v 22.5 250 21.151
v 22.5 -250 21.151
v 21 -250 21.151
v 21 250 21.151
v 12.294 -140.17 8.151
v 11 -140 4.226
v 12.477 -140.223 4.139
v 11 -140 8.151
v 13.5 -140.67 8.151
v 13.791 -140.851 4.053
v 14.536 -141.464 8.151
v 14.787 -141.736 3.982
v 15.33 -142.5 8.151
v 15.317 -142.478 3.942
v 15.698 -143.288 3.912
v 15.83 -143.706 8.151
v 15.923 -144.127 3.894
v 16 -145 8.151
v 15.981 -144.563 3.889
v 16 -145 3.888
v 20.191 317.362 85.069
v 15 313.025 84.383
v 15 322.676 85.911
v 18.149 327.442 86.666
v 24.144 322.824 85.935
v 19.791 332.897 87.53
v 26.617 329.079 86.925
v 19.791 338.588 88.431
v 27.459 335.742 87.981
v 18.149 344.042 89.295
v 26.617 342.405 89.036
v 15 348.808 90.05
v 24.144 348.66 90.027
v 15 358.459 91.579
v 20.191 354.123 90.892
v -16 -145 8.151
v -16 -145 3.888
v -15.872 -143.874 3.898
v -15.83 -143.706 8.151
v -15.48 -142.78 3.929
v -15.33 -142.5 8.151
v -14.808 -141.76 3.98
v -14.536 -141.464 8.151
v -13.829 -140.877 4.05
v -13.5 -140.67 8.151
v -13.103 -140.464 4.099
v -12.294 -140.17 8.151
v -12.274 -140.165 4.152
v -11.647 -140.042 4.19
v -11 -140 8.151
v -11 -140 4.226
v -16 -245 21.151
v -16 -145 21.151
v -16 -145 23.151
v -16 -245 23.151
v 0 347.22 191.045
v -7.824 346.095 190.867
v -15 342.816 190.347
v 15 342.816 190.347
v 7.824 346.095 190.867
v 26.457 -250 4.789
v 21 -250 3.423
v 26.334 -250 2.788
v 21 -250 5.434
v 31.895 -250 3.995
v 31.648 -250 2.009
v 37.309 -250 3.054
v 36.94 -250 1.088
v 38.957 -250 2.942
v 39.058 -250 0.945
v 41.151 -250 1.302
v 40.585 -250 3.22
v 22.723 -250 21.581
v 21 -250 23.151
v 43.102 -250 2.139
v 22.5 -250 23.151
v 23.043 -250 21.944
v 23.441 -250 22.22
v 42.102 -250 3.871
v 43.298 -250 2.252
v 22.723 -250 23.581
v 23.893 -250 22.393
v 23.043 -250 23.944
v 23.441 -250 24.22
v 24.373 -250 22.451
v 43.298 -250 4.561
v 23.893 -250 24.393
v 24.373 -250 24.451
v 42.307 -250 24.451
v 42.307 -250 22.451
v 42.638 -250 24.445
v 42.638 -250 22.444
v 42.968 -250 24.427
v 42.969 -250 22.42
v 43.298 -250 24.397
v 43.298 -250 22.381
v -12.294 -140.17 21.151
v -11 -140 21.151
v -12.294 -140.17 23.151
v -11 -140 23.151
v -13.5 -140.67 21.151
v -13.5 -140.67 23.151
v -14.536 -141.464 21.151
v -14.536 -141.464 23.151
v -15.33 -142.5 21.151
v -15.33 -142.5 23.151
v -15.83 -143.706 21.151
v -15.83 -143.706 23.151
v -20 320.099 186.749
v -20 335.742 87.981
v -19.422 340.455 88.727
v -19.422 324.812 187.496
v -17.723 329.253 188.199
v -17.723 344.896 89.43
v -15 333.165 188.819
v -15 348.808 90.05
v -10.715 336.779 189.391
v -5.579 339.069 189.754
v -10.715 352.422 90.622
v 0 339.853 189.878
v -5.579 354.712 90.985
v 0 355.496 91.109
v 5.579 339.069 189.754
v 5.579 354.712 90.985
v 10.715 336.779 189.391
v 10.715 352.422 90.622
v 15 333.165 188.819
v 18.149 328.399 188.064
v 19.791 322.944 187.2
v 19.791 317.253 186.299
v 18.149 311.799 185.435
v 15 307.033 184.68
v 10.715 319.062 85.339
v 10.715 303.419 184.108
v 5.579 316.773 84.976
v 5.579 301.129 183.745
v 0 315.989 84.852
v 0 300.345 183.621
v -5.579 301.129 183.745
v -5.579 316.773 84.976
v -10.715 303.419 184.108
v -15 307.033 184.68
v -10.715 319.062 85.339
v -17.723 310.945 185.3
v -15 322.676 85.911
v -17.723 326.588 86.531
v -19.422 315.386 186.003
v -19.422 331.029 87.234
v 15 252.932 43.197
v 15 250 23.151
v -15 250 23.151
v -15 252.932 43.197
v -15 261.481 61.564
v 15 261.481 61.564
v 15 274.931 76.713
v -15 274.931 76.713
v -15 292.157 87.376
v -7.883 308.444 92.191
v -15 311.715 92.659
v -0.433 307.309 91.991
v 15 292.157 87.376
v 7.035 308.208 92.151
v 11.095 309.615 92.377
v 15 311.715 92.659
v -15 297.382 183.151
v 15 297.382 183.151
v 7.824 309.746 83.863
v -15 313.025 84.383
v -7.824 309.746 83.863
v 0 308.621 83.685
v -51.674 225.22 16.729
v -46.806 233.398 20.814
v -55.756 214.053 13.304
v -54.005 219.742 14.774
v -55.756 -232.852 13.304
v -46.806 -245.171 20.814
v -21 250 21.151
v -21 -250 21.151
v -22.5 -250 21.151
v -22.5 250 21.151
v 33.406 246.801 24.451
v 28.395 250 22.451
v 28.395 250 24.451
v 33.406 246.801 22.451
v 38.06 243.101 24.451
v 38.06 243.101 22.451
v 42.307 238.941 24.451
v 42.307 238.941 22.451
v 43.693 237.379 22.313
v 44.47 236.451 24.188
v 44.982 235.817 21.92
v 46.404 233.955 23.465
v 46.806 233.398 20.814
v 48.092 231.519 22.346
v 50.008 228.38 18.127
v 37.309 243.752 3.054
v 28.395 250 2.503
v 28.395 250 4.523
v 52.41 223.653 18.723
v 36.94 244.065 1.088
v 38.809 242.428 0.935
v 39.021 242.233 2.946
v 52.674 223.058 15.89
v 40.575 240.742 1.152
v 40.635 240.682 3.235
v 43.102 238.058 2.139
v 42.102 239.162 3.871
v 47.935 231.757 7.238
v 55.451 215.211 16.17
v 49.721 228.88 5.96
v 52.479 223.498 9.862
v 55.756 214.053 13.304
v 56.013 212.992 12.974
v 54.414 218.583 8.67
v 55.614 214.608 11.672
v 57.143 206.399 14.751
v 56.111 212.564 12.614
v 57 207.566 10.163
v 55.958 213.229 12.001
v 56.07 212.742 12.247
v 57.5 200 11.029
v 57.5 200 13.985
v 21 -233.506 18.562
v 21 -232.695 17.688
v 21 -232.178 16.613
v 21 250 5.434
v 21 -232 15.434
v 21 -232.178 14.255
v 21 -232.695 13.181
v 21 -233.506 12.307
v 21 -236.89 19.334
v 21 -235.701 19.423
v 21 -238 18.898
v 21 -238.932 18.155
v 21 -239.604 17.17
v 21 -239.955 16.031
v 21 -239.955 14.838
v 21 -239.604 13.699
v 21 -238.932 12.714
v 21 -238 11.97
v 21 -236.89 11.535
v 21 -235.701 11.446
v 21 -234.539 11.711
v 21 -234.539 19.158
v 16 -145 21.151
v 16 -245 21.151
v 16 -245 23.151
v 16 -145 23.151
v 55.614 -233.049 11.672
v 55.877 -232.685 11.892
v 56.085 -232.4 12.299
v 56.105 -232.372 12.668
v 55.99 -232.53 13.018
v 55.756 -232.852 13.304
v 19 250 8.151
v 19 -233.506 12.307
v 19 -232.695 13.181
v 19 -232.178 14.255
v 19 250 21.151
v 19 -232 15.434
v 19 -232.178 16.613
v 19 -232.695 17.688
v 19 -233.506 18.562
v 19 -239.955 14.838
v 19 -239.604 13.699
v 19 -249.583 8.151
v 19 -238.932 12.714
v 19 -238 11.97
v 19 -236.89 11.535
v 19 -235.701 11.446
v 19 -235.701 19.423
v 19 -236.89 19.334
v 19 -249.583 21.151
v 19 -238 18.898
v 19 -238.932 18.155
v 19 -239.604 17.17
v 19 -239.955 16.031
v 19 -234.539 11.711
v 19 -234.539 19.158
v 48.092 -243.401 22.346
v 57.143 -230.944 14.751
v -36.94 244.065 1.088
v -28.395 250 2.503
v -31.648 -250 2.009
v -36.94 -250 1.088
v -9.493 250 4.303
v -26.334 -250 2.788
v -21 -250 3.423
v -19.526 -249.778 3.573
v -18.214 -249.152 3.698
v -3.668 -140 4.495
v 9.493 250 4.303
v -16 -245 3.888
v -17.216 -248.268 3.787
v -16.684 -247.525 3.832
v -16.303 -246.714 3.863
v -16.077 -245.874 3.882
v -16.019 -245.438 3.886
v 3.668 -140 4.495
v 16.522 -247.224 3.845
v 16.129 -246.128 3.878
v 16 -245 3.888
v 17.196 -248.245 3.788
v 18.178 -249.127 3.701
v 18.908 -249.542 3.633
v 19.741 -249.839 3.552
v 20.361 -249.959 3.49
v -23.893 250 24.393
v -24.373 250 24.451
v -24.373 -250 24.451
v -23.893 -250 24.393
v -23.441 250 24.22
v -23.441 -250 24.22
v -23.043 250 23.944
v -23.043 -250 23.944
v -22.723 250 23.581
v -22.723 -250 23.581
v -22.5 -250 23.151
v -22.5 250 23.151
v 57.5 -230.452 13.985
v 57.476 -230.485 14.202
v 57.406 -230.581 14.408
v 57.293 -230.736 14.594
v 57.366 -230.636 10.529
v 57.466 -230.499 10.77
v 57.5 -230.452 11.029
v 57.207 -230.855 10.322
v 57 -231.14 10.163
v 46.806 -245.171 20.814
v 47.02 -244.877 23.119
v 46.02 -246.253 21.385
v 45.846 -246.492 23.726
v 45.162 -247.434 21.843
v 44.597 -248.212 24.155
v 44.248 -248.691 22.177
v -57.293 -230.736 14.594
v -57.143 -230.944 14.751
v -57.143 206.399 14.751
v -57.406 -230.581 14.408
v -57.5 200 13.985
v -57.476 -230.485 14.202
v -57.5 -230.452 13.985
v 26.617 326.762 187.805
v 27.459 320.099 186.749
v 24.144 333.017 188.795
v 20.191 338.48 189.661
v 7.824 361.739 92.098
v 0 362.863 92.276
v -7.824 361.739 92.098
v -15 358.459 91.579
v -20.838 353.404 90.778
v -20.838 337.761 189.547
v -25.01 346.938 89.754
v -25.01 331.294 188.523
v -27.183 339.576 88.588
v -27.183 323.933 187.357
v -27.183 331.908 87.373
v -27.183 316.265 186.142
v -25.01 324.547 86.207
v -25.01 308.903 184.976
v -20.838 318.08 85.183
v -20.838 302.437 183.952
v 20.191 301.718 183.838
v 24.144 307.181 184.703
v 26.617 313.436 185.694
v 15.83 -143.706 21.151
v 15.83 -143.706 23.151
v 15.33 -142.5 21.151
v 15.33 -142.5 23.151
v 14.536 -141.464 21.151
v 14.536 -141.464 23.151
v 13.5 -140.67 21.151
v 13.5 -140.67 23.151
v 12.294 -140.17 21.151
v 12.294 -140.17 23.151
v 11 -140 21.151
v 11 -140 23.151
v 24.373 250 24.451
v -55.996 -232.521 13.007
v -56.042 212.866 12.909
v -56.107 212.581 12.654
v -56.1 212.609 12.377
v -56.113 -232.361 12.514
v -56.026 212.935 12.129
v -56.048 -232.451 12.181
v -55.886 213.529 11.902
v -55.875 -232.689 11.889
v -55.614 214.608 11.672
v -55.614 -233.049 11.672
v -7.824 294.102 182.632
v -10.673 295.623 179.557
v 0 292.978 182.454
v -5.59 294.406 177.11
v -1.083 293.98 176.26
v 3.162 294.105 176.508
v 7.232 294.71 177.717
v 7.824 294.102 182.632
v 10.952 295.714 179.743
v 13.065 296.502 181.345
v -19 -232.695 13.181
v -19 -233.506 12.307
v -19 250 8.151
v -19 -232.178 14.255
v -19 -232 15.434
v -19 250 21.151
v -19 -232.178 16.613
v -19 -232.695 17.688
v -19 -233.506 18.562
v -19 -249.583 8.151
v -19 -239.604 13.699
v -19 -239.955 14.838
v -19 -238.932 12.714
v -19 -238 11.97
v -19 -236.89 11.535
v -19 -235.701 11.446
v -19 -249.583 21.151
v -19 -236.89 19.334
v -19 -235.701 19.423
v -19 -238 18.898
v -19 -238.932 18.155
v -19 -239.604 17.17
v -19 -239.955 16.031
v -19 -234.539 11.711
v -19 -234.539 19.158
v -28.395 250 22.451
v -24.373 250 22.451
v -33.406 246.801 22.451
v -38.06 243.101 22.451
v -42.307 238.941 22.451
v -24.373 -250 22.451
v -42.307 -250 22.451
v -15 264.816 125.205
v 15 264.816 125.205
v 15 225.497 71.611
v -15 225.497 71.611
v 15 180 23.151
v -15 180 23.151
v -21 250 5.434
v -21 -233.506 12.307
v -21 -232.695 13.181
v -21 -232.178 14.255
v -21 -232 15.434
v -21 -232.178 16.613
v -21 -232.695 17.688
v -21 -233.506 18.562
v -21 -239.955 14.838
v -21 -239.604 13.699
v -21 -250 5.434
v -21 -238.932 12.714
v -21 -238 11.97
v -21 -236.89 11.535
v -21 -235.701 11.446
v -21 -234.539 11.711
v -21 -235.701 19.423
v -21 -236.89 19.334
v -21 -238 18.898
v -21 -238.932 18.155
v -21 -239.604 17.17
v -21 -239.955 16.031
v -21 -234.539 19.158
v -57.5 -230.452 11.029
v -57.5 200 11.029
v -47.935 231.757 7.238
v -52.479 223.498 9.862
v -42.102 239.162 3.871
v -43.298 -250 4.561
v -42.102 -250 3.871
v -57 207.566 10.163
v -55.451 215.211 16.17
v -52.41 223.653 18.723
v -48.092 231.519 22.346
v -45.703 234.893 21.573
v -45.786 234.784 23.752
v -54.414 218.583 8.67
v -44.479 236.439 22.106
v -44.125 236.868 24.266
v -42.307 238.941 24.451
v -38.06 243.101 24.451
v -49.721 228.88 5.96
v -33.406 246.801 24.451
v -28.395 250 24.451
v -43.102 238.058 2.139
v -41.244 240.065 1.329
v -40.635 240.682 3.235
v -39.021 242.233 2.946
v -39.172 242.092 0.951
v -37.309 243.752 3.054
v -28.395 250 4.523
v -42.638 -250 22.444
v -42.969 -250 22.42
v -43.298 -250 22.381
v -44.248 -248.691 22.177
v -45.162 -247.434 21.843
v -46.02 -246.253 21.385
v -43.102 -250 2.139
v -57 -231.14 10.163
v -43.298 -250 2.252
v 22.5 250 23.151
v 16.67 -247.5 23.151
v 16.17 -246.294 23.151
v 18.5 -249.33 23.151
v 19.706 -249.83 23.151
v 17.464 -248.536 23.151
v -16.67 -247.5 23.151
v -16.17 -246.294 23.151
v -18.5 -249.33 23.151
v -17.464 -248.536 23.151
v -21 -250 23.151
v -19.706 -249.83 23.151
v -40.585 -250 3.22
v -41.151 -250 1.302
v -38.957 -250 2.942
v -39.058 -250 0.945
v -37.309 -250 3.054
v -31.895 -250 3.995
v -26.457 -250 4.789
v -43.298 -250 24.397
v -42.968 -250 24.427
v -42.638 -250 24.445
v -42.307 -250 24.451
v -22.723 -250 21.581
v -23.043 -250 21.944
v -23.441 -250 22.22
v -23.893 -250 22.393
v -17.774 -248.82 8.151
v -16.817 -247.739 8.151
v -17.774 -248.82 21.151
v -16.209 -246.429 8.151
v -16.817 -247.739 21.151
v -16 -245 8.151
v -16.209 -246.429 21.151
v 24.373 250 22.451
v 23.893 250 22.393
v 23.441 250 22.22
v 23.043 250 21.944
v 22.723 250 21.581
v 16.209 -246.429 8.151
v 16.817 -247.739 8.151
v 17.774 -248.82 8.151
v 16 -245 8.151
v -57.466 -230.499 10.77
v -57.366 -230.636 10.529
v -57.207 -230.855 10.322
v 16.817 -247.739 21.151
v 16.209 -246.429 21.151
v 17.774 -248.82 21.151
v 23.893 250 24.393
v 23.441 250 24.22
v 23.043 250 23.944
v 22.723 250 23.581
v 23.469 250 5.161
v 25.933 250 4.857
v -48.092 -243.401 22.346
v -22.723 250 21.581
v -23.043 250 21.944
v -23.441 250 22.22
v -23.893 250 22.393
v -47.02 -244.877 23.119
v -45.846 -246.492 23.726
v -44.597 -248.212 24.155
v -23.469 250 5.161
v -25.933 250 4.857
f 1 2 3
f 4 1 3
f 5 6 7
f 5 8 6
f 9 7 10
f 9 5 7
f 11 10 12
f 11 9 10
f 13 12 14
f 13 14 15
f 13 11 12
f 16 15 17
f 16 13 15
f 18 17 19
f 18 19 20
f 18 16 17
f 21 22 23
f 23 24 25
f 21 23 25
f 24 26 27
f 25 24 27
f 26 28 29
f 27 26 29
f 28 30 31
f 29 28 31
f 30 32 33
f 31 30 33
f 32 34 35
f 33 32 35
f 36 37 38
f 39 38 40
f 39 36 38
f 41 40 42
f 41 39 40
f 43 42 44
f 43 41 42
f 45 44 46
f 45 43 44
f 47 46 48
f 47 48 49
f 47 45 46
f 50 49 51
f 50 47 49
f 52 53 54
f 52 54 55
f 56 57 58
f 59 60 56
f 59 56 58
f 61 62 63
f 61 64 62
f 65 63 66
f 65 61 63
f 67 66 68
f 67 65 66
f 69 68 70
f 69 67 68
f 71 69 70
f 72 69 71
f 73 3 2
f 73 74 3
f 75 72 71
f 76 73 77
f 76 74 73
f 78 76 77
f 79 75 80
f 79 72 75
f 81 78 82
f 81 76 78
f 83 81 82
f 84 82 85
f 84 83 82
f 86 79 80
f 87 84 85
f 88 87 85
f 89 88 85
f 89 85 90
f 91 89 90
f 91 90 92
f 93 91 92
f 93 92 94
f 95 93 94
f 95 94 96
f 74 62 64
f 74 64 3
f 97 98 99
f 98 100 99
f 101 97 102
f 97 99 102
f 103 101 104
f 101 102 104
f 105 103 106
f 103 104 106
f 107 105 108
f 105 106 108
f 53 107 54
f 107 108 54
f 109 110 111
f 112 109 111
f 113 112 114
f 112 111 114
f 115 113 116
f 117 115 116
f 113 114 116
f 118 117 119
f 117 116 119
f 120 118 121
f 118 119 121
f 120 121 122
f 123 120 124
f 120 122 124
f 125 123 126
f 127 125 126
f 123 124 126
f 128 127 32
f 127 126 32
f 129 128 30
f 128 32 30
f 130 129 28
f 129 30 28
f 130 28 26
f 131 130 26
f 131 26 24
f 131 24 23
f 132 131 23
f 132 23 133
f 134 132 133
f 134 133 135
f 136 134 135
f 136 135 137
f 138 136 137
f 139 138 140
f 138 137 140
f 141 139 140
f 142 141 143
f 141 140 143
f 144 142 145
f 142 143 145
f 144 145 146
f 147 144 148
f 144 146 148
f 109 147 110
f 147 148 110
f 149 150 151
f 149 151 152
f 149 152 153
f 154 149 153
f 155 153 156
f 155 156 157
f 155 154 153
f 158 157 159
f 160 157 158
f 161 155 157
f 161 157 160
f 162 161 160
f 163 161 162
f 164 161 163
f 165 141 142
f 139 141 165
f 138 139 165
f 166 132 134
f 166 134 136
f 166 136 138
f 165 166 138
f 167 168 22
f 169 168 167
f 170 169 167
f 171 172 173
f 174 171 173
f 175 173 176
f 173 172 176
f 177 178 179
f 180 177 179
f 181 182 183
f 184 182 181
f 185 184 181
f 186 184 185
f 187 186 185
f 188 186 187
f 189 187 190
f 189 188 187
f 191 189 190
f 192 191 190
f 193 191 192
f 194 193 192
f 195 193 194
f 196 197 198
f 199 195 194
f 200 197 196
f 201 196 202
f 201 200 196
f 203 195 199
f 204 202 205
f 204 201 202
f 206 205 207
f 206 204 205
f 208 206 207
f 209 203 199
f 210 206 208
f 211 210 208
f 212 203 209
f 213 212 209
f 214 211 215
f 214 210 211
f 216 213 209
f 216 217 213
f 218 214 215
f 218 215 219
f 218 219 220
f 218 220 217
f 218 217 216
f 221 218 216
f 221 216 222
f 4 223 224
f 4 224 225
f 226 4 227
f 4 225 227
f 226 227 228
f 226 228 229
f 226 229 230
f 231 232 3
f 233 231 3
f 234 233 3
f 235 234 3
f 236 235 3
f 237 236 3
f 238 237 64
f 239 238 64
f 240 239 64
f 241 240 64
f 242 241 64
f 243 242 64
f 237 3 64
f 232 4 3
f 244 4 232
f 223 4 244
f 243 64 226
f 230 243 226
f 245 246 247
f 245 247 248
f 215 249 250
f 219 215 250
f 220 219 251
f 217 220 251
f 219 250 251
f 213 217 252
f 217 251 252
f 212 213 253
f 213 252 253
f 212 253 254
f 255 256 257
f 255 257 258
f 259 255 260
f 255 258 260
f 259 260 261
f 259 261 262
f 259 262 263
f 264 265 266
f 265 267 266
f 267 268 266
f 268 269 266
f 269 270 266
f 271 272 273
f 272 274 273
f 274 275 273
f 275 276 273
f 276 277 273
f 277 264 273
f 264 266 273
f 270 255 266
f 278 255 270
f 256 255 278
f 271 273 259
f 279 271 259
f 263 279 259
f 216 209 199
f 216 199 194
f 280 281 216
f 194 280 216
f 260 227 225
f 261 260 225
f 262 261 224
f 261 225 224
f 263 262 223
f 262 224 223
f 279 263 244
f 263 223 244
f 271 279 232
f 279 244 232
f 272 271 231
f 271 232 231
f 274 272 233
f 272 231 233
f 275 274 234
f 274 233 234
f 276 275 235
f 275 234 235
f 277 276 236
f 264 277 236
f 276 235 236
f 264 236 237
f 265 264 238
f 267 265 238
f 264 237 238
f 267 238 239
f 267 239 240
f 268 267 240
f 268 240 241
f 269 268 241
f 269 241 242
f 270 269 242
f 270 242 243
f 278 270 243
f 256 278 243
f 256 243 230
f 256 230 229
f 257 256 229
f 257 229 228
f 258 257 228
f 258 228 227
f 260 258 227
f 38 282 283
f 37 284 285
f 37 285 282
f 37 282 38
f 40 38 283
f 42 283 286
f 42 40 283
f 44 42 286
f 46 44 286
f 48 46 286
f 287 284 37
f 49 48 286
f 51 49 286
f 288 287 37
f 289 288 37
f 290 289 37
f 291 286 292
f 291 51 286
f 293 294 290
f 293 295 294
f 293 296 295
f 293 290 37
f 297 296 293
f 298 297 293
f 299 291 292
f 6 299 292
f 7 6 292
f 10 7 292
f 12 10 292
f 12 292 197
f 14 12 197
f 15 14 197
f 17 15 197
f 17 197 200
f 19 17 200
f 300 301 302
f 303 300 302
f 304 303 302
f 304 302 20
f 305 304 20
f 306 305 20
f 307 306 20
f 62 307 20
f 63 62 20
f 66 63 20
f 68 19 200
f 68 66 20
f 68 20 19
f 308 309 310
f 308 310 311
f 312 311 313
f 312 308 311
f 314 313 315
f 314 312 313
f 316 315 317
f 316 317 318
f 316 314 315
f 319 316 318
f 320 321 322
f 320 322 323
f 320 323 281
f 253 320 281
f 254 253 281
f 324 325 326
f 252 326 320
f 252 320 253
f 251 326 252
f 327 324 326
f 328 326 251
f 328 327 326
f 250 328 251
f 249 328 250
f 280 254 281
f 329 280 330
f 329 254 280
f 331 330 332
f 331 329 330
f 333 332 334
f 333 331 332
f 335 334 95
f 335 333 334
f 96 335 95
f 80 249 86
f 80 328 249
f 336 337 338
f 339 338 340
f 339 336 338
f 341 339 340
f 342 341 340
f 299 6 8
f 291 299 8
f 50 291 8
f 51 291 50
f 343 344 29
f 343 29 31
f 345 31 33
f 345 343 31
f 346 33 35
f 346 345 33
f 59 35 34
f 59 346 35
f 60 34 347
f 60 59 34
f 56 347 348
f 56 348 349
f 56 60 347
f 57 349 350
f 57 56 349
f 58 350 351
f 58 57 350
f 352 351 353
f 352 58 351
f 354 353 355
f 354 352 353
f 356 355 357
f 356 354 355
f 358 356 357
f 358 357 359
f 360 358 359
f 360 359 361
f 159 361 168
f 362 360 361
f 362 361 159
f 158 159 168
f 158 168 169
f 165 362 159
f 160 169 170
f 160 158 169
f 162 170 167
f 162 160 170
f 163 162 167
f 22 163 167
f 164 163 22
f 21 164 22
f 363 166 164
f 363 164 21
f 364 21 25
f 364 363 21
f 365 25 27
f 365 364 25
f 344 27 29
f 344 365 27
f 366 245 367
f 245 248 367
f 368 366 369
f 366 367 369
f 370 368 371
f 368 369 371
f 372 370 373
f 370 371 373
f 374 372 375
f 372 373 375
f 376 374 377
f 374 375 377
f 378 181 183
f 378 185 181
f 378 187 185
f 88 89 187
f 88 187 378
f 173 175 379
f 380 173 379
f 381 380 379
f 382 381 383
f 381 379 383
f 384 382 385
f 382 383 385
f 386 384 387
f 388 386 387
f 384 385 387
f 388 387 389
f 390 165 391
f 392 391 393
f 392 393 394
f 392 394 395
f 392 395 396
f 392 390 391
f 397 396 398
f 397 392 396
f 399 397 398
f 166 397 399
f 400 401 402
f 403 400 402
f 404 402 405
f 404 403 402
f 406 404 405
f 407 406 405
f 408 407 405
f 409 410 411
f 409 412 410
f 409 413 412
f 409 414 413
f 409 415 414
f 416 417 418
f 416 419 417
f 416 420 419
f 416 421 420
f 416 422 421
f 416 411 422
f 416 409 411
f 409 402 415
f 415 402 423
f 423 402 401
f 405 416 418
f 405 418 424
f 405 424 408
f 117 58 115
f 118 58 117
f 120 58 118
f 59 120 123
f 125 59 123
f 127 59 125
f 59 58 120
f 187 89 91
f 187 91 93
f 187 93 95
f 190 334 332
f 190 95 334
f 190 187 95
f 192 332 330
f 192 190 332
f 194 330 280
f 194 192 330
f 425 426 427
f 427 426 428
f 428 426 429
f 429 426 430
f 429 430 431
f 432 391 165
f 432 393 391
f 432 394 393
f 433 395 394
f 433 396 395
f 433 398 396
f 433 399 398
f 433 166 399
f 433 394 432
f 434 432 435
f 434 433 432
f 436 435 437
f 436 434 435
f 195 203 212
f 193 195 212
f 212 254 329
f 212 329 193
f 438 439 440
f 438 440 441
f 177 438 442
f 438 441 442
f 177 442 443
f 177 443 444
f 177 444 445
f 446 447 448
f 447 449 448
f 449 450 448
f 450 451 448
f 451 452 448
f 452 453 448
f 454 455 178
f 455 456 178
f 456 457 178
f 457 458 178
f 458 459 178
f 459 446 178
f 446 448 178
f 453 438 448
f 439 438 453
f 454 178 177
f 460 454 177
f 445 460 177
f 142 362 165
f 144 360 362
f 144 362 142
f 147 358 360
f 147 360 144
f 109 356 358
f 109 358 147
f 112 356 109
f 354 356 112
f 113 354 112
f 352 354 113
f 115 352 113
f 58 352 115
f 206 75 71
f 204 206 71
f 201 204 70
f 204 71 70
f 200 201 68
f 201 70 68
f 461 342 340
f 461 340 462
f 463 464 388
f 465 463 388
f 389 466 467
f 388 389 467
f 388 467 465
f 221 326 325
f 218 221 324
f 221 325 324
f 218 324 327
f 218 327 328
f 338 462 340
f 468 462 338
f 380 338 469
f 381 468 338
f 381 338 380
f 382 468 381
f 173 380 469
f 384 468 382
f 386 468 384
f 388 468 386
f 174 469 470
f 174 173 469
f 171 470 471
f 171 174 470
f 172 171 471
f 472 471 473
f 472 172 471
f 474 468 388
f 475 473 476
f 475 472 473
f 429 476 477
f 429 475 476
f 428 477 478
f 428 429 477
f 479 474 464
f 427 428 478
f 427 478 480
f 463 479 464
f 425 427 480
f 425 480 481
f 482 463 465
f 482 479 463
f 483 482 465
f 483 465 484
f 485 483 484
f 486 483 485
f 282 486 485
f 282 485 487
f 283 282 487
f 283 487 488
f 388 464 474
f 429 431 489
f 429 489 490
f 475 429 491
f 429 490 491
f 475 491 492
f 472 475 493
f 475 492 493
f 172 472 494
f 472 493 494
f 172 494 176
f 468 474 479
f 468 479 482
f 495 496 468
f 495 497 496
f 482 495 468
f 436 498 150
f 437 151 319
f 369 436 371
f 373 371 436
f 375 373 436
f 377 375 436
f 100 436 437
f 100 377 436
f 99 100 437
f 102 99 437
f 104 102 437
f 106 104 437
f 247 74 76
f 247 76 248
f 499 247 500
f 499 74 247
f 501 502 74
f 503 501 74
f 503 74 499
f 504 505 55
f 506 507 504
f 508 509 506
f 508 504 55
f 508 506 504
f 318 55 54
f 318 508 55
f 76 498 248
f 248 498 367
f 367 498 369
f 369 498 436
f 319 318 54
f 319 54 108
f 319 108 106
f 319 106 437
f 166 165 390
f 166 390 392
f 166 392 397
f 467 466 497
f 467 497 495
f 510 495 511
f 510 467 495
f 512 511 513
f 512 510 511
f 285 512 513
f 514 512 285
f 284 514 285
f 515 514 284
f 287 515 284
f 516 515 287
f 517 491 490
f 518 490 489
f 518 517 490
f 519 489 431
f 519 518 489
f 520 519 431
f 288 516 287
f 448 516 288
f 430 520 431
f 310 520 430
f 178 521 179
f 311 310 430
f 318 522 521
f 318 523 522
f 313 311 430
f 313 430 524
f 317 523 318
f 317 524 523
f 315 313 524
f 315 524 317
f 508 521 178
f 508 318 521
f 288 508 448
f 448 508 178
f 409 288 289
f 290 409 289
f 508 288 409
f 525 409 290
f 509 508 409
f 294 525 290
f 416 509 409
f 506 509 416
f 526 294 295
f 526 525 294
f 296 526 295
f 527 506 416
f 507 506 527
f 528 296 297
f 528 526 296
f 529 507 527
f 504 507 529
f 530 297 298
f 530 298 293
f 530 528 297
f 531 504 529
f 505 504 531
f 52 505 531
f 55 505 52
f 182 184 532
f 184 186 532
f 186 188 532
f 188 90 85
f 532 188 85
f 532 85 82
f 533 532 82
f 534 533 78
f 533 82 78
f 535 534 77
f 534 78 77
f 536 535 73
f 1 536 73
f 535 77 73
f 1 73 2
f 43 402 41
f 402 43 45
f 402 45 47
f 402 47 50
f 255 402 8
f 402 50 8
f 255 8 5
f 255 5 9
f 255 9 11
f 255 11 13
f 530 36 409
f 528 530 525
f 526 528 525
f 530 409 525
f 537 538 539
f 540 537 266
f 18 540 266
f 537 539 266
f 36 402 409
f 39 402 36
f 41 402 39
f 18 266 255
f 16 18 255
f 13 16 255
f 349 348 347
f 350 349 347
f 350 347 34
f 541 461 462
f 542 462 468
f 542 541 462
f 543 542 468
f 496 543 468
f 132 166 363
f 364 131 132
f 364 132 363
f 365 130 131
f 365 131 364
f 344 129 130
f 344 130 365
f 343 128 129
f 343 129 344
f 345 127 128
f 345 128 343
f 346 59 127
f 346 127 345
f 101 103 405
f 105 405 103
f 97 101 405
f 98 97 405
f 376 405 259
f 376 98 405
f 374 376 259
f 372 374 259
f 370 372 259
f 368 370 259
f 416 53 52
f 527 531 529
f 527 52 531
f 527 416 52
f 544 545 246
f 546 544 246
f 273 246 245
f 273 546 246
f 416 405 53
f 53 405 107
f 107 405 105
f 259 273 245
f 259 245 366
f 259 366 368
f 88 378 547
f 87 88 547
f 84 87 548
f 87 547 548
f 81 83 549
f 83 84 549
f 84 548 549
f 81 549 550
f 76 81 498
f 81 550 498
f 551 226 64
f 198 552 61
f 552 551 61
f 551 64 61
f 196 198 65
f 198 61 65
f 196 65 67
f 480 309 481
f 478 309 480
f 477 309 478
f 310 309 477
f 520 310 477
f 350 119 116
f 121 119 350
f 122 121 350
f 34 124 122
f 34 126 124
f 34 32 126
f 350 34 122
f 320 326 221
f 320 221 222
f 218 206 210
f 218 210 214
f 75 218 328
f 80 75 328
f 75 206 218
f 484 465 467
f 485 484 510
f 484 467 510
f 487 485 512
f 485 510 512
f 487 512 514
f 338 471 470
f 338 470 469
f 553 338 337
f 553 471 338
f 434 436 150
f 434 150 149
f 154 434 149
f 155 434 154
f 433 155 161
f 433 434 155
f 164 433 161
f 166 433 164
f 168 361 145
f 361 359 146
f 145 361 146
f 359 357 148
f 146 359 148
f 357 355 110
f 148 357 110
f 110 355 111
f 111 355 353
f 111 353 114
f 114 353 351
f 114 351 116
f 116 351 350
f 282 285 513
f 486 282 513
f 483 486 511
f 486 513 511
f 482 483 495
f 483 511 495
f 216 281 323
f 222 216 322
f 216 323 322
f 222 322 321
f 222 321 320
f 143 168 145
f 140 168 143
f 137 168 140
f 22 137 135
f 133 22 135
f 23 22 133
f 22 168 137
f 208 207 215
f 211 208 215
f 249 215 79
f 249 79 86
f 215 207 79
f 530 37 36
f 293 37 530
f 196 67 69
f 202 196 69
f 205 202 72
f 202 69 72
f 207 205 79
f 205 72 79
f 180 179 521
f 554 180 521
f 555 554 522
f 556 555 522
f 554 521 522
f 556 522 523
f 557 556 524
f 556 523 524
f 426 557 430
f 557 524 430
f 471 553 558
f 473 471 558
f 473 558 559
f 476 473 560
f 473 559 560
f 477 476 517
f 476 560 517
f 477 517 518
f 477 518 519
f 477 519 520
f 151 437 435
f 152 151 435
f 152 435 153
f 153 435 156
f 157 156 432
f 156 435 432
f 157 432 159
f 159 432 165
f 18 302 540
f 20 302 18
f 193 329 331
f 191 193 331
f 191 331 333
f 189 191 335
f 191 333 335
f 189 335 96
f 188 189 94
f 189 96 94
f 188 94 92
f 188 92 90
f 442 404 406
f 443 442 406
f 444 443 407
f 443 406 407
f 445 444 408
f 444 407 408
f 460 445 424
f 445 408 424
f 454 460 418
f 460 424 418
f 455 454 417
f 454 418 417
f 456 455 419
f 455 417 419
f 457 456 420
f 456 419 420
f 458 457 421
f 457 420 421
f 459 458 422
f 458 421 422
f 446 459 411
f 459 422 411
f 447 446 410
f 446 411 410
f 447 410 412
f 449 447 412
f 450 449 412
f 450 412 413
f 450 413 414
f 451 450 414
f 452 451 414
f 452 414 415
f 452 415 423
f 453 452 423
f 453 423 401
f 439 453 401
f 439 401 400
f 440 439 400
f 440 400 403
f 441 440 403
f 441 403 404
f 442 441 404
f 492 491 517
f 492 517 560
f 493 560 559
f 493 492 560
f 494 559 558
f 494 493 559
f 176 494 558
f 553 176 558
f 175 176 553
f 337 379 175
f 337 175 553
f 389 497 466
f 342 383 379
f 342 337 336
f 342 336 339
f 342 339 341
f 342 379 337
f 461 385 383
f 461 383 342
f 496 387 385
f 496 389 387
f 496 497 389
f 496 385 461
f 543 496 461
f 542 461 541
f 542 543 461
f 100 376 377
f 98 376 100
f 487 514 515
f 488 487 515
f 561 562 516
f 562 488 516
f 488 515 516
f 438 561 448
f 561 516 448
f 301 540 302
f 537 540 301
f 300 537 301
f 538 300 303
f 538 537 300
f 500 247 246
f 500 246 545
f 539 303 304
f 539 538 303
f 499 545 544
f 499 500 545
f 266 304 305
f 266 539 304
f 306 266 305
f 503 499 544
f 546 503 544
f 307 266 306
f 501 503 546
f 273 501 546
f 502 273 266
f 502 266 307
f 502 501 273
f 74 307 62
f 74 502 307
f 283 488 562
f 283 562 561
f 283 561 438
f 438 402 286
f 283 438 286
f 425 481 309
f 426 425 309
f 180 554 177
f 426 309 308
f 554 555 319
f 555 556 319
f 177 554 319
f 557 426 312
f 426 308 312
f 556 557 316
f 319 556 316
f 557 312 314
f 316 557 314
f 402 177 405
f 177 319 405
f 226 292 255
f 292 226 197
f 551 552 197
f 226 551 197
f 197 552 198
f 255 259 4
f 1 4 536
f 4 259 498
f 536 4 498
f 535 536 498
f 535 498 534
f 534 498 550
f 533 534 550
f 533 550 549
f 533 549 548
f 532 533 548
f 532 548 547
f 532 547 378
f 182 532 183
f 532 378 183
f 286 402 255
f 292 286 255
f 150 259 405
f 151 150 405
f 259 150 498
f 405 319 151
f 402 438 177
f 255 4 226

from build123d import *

# Parameters (mm, degrees)
F1_DEPTH       = 250
F2_W           = 38
F2_H           = 13
F3_DEPTH       = 250
F4_T1_DEPTH    = 509.3674969976
F5_R           = 9
F6_R           = 1
F8_DEPTH       = 500.001
F10_DEPTH      = 24.4523840141
F10_DEPTH_BACK = 527
F12_DEPTH      = 527
F12_DEPTH_BACK = 24.4523841141
F13_F1_R       = 4.9999
F13_F2_R       = 4.9999
F13_F3_R       = 5
F13_F4_R       = 5
F13_F5_R       = 5
F13_F6_R       = 5
F15_DEPTH      = 15
F16_R          = 27.4590604355
F17_DEPTH      = 100
F19_D          = 40
F21_D          = 8
F21_DEPTH      = 50
F21_TIP        = 2.4034424761


# Not quite as in the source:
# - a fillet or chamfer that OpenCascade refuses, or shapes differently, is made with other operations: its cross-section is extruded or revolved along the edge and cut away or added
# - a fillet or chamfer is up to 0.001 mm smaller than in the source, because OpenCascade refuses the exact size
# - an extrude ends at something that could not be found from the text; its depth is read off the source's solid


with BuildPart() as f1:
    # F0 (on Front) → F1 (new body, symmetric)
    with BuildSketch(Plane.XZ):
        with BuildLine():
            Line((22.5, 23.1513840141), (0, 23.1513840141))
            Line((0, 23.1513840141), (-22.5, 23.1513840141))
            Line((-22.5, 23.1513840141), (-22.5, 24.4513840141))
            Line((-22.5, 24.4513840141), (-45.5824640741, 24.4513840141))
            Line((-45.5824640741, 24.4513840141), (-57.5, 14.4513840141))
            Line((-57.5, 14.4513840141), (-57.5, 10.4513840141))
            Line((-57.5, 10.4513840141), (-40.1794919243, 0.4513840141))
            ThreePointArc((-40.1794919243, 0.4513840141), (0, 4.5289288725), (40.1794919243, 0.4513840141))
            Line((40.1794919243, 0.4513840141), (57.5, 10.4513840141))
            Line((57.5, 10.4513840141), (57.5, 14.4513840141))
            Line((57.5, 14.4513840141), (45.5824640741, 24.4513840141))
            Line((45.5824640741, 24.4513840141), (22.5, 24.4513840141))
            Line((22.5, 24.4513840141), (22.5, 23.1513840141))
        make_face()
    extrude(amount=F1_DEPTH, both=True)

    # F2 (on Front) → F3 (cut, symmetric)
    with BuildSketch(Plane.XZ):
        with Locations((0, 14.6513840141)):
            Rectangle(F2_W, F2_H)
    extrude(amount=F3_DEPTH, both=True, mode=Mode.SUBTRACT)

    # F4: fillet of radius 2 on 2 edges, made by hand

    # F4_s2 → F4_t1 (cut)
    with BuildSketch(Plane.XZ.offset(-254.6837484988)):
        with BuildLine():
            ThreePointArc((-24.3734993995, 24.4513840141), (-23.2333239744, 24.0945516866), (-22.5, 23.1513840141))
            Line((-22.5, 23.1513840141), (-22.5, 24.4513840141))
            Line((-22.5, 24.4513840141), (-24.3734993995, 24.4513840141))
        make_face()
        with BuildLine():
            ThreePointArc((24.3734993995, 24.4513840141), (23.2333239744, 24.0945516866), (22.5, 23.1513840141))
            Line((22.5, 23.1513840141), (22.5, 24.4513840141))
            Line((22.5, 24.4513840141), (24.3734993995, 24.4513840141))
        make_face()
    extrude(amount=F4_T1_DEPTH, mode=Mode.SUBTRACT)

    # F5
    f5_edges = [f1.edges().sort_by_distance(p)[0] for p in [
        (-45.582464, 0, 24.451384),
        (-40.179492, 0, 0.451384),
        (40.179492, 0, 0.451384),
        (45.582464, 0, 24.451384),
    ]]
    fillet(f5_edges, radius=F5_R)

    # F6
    f6_edges = [f1.edges().sort_by_distance(p)[0] for p in [
        (57.5, 0, 14.451384),
        (57.5, 0, 10.451384),
        (-57.5, 0, 10.451384),
        (-57.5, 0, 14.451384),
    ]]
    fillet(f6_edges, radius=F6_R)

    # F7 (on face) → F8 (cut, through all)
    with BuildSketch(Plane.XZ.offset(250)):
        with BuildLine():
            ThreePointArc((-42.1022690923, 3.8709010064), (-39.7790673433, 3.0327059534), (-37.3093701274, 3.0535140017))
            ThreePointArc((-37.3093701274, 3.0535140017), (-29.1789785809, 4.4103617496), (-21, 5.4343792715))
            Line((-21, 5.4343792715), (-21, 21.1513840141))
            Line((-21, 21.1513840141), (-22.5, 21.1513840141))
            ThreePointArc((-22.5, 21.1513840141), (-23.2333239744, 22.0945516866), (-24.3734993995, 22.4513840141))
            Line((-24.3734993995, 22.4513840141), (-42.3067319657, 22.4513840141))
            ThreePointArc((-42.3067319657, 22.4513840141), (-44.7008729689, 22.0292323596), (-46.8062452335, 20.813695116))
            Line((-46.8062452335, 20.813695116), (-55.7563117574, 13.3036975967))
            ThreePointArc((-55.7563117574, 13.3036975967), (-56.1097188459, 12.4504974108), (-55.6135241478, 11.6716277498))
            Line((-55.6135241478, 11.6716277498), (-42.1022690923, 3.8709010064))
        make_face()
        with BuildLine():
            Line((21, 21.1513840141), (21, 5.4343792715))
            ThreePointArc((21, 5.4343792715), (29.1789785809, 4.4103617496), (37.3093701274, 3.0535140017))
            ThreePointArc((37.3093701274, 3.0535140017), (39.7790673433, 3.0327059534), (42.1022690923, 3.8709010064))
            Line((42.1022690923, 3.8709010064), (55.6135241478, 11.6716277498))
            ThreePointArc((55.6135241478, 11.6716277498), (56.1097188459, 12.4504974108), (55.7563117574, 13.3036975967))
            Line((55.7563117574, 13.3036975967), (46.8062452335, 20.813695116))
            ThreePointArc((46.8062452335, 20.813695116), (44.7008729689, 22.0292323596), (42.3067319657, 22.4513840141))
            Line((42.3067319657, 22.4513840141), (24.3734993995, 22.4513840141))
            ThreePointArc((24.3734993995, 22.4513840141), (23.2333239744, 22.0945516866), (22.5, 21.1513840141))
            Line((22.5, 21.1513840141), (21, 21.1513840141))
        make_face()
    extrude(amount=-F8_DEPTH, mode=Mode.SUBTRACT)

    # F9 (on Top) → F10 (cut, two sides)
    with BuildSketch(Plane.XY) as f10_sk:
        with BuildLine():
            ThreePointArc((-57.5, 200), (0, 257.5), (57.5, 200))
            Line((57.5, 200), (57.5, 280))
            Line((57.5, 280), (-57.5, 280))
            Line((-57.5, 280), (-57.5, 200))
        make_face()
    extrude(amount=F10_DEPTH, mode=Mode.SUBTRACT)
    extrude(f10_sk.sketch, amount=-F10_DEPTH_BACK, mode=Mode.SUBTRACT)

    # F11 (on Top) → F12 (cut, two sides)
    with BuildSketch(Plane.XY) as f12_sk:
        Polygon((-43.2975540478, -250), (-68, -216), (-68, -346), (68, -346), (68, -216), (43.2975540478, -250), (16, -250), (16, -140), (-16, -140), (-16, -250), align=None)
    extrude(amount=-F12_DEPTH, mode=Mode.SUBTRACT)
    extrude(f12_sk.sketch, amount=F12_DEPTH_BACK, mode=Mode.SUBTRACT)

    # F13: fillet of radius 5 on 8 edges, made by hand

    # F13_f1 (radius 5 in the source; OpenCascade refuses exactly that, so slightly less here)
    f13_f1_edges = [f1.edges().sort_by_distance(p)[0] for p in [
        (-16, -250, 22.1513840141),
    ]]
    fillet(f13_f1_edges, radius=F13_F1_R)

    # F13_f2 (radius 5 in the source; OpenCascade refuses exactly that, so slightly less here)
    f13_f2_edges = [f1.edges().sort_by_distance(p)[0] for p in [
        (16, -250, 6.0196427984),
    ]]
    fillet(f13_f2_edges, radius=F13_F2_R)

    # F13_f3
    f13_f3_edges = [f1.edges().sort_by_distance(p)[0] for p in [
        (16, -140, 22.1513840141),
    ]]
    fillet(f13_f3_edges, radius=F13_F3_R)

    # F13_f4
    f13_f4_edges = [f1.edges().sort_by_distance(p)[0] for p in [
        (-16, -140, 22.1513840141),
    ]]
    fillet(f13_f4_edges, radius=F13_F4_R)

    # F13_f5
    f13_f5_edges = [f1.edges().sort_by_distance(p)[0] for p in [
        (-16, -140, 6.0196427984),
    ]]
    fillet(f13_f5_edges, radius=F13_F5_R)

    # F13_f6
    f13_f6_edges = [f1.edges().sort_by_distance(p)[0] for p in [
        (16, -140, 6.0196427984),
    ]]
    fillet(f13_f6_edges, radius=F13_F6_R)

    # F14 (on Right) → F15 (join, symmetric)
    with BuildSketch(Plane.YZ):
        with BuildLine():
            ThreePointArc((297.3819995028, 183.1513840141), (245.9666940414, 97.8136618671), (180, 23.1513840141))
            Line((180, 23.1513840141), (250, 23.1513840141))
            ThreePointArc((250, 23.1513840141), (267.6550746197, 69.6272787008), (311.7145367693, 92.6593051387))
            Line((311.7145367693, 92.6593051387), (313.0254460068, 84.3825499546))
            Line((313.0254460068, 84.3825499546), (358.4591096742, 91.5785353465))
            Line((358.4591096742, 91.5785353465), (342.8156631702, 190.347369406))
            Line((342.8156631702, 190.347369406), (297.3819995028, 183.1513840141))
        make_face()
    extrude(amount=F15_DEPTH, both=True)

    # F16 (on face) → F17 (join, through all)
    with BuildSketch(Plane(origin=(0, -21.0209895784, 132.7213047908), x_dir=(1, 0, 0), z_dir=(0, -0.156434465, 0.9876883406))):
        with Locations((0, 345.3719223914)):
            Circle(F16_R)
    extrude(amount=-F17_DEPTH)

    # F19 (through all)
    with Locations(Plane(origin=(0, -21.0209895784, 132.7213047908), x_dir=(1, 0, 0), z_dir=(0, -0.156434465, 0.9876883406))):
        with Locations((0, 345.3719223914)):
            Hole(F19_D / 2)

    # F21 (one way)
    with BuildSketch(Plane.YZ.offset(21)):
        with Locations((-236, 15.4343792715)):
            Circle(F21_D / 2)
    extrude(amount=-F21_DEPTH, mode=Mode.SUBTRACT)
    with Locations(Plane.YZ.offset(21)):
        with Locations((-236, 15.4343792715)):
            with Locations((0, 0, -(F21_DEPTH + F21_TIP / 2))):  # 118° drill point
                Cone(0, F21_D / 2, F21_TIP, mode=Mode.SUBTRACT)


solid = f1.part
